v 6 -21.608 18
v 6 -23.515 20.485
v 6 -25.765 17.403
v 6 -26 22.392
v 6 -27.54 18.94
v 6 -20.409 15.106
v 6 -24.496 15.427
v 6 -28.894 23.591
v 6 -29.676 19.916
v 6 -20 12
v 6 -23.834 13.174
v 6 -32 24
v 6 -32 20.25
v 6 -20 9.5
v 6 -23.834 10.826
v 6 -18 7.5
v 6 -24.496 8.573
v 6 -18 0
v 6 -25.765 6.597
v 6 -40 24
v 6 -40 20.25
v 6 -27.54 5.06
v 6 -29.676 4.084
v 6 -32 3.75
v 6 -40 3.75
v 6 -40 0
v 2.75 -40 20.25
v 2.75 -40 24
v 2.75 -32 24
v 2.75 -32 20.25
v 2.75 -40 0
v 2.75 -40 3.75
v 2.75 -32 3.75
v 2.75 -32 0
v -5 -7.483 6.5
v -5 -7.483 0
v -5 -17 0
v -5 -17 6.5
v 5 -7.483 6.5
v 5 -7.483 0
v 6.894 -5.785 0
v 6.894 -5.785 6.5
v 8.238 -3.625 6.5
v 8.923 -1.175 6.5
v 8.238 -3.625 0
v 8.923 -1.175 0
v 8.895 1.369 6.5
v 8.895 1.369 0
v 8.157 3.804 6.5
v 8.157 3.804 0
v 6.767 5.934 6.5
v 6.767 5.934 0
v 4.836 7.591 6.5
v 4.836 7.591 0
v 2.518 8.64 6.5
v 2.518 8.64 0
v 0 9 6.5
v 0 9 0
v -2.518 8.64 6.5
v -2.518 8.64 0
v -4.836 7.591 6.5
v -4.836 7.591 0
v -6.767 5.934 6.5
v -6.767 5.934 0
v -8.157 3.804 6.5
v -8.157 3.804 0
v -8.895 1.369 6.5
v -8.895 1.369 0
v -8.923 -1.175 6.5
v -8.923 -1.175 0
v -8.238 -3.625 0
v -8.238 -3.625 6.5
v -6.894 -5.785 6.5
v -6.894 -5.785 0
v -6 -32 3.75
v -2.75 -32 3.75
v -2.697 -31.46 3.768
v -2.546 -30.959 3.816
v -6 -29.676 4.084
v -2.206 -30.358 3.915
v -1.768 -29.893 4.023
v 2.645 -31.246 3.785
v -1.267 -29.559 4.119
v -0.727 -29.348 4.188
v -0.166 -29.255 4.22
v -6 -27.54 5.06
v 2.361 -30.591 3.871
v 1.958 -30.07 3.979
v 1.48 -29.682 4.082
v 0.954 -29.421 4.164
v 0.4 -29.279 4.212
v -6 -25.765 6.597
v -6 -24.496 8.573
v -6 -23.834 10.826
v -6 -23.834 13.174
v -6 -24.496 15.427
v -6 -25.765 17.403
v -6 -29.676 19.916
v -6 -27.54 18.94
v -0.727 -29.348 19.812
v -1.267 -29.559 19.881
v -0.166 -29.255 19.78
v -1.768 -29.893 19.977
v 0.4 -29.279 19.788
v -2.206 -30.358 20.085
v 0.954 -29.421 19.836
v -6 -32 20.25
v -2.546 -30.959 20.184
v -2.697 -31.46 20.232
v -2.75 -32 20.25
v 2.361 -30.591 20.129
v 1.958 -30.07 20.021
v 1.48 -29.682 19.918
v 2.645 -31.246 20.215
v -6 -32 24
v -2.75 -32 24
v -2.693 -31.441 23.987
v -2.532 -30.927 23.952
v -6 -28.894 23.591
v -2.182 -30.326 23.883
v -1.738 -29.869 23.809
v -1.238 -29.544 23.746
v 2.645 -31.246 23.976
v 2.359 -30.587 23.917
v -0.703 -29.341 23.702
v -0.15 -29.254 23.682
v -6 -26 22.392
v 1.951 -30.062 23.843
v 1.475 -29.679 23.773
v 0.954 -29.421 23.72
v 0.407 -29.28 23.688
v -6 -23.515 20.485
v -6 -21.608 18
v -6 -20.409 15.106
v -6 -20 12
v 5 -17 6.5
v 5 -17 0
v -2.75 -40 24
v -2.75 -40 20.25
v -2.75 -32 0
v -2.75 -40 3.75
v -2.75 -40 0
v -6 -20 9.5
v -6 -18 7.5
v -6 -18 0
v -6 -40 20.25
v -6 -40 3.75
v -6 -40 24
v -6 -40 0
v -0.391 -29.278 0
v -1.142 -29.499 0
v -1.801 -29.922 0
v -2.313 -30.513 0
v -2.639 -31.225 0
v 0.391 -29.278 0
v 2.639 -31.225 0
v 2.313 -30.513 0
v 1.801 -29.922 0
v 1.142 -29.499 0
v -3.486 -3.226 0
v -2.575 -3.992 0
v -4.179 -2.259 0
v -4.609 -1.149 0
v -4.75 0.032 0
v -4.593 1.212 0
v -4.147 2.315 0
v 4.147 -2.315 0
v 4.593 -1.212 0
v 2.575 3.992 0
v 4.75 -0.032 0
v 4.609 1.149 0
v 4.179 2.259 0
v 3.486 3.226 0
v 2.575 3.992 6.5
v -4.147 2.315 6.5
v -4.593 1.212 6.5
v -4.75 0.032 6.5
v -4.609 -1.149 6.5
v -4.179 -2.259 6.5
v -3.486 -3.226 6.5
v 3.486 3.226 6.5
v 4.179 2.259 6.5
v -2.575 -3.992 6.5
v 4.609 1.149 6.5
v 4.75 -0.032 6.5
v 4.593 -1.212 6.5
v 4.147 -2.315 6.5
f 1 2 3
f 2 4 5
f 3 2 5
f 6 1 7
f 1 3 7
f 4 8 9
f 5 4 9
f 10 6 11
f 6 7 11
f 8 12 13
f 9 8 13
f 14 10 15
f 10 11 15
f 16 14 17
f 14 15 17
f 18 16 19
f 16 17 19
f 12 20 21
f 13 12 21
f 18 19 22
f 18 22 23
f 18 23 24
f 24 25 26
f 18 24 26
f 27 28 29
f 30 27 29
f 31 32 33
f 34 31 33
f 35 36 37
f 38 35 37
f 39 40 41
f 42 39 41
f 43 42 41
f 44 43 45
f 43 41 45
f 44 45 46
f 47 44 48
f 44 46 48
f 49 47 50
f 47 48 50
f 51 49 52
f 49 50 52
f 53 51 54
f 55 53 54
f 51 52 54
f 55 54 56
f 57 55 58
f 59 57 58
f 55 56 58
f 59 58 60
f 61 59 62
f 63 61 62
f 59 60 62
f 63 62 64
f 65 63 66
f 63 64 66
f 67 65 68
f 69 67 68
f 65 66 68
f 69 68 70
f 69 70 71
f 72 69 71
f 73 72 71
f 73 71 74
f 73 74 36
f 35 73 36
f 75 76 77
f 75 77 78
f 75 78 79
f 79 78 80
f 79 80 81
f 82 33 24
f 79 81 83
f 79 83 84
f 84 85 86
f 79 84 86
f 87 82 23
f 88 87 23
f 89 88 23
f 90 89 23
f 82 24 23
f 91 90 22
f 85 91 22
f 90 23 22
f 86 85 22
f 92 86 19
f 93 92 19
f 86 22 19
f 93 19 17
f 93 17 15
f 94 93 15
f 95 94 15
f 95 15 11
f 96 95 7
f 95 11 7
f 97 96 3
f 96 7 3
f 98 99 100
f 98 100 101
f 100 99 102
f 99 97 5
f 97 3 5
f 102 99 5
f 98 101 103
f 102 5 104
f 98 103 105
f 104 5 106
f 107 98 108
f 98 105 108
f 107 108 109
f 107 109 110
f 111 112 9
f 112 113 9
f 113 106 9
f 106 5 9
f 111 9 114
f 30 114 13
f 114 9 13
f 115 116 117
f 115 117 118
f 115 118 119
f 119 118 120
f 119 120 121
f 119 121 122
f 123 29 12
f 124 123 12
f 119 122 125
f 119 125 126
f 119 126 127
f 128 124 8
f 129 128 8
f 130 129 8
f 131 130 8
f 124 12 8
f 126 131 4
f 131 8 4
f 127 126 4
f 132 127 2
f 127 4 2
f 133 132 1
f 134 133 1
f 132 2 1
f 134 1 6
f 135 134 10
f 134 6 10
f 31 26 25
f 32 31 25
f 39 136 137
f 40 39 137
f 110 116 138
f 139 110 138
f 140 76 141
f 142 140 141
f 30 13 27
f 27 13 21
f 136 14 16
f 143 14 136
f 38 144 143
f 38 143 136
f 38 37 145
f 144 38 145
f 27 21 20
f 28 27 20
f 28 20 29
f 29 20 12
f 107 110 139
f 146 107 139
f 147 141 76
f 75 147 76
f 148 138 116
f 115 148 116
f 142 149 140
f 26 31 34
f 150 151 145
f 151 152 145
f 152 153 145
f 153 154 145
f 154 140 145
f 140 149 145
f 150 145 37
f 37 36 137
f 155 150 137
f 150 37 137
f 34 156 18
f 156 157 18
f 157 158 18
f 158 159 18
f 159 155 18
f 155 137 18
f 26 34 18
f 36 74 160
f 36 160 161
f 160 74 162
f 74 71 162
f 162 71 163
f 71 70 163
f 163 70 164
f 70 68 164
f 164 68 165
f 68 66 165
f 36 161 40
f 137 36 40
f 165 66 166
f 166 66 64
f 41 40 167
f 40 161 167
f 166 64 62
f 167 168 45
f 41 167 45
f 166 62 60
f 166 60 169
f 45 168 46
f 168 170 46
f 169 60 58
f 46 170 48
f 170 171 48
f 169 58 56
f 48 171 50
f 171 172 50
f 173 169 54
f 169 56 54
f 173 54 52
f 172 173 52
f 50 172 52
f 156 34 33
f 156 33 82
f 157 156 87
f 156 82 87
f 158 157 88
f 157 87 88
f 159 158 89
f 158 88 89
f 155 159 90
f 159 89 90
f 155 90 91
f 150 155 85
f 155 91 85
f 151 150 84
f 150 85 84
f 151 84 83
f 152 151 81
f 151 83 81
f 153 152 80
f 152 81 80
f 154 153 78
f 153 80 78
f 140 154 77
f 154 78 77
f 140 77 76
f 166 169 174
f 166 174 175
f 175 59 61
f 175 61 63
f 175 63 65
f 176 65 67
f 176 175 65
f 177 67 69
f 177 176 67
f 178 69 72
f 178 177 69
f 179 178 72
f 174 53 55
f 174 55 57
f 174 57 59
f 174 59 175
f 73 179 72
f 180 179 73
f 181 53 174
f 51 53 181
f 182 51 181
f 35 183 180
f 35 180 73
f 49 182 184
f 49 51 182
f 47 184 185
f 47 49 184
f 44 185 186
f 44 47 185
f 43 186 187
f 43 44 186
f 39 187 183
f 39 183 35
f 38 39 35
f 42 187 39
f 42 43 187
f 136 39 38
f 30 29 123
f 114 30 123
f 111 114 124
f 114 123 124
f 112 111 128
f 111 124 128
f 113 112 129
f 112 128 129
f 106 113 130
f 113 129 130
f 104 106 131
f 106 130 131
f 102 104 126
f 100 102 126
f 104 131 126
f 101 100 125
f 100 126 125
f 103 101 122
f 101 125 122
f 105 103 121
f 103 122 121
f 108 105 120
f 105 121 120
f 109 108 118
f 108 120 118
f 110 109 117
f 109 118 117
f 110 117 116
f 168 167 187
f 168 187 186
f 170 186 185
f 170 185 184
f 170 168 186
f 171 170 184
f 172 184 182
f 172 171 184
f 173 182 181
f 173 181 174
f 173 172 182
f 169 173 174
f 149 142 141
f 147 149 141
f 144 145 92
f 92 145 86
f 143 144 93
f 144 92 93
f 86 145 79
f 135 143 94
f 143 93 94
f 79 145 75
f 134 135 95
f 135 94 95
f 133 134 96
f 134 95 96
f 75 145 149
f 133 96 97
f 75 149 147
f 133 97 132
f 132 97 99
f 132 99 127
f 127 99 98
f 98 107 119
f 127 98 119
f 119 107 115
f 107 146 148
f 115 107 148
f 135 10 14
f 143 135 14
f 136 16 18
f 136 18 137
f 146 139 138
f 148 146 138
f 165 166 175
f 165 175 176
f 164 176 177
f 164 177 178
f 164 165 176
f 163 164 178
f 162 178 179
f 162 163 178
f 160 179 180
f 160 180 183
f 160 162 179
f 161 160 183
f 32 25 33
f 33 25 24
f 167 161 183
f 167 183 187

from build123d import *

# Parameters (mm, degrees)
BOSS_EXTRUDE1_DEPTH = 6.5
BOSS_EXTRUDE2_DEPTH = 6
CUT_EXTRUDE1_DEPTH  = 48.507894081
CHAMFER1_SIZE       = 3


with BuildPart() as part:
    # Sketch1 → Boss-Extrude1 (new body)
    with BuildSketch(Plane.XY):
        with BuildLine():
            Line((-5, -7.483314774), (-5, -22))
            Line((-5, -22), (5, -22))
            Line((5, -22), (5, -7.483314774))
            ThreePointArc((5, -7.483314774), (0, 9), (-5, -7.483314774))
        make_face()
        with BuildLine():
            Line((2.574956832, 3.99150314), (-4.147449153, 2.315419081))
            ThreePointArc((-4.147449153, 2.315419081), (-4.6089047, -1.149129004), (-2.574956832, -3.99150314))
            Line((-2.574956832, -3.99150314), (4.147449153, -2.315419081))
            ThreePointArc((4.147449153, -2.315419081), (4.6089047, 1.149129004), (2.574956832, 3.99150314))
        make_face(mode=Mode.SUBTRACT)
    extrude(amount=BOSS_EXTRUDE1_DEPTH)

    # Sketch2 → Boss-Extrude2 (add, symmetric)
    with BuildSketch(Plane(origin=(0, 0, 0), x_dir=(0, 0, -1), z_dir=(1, 0, 0))):
        with BuildLine():
            Line((-12, -20), (0, -20))
            Line((0, -20), (0, -40))
            Line((0, -40), (-3.75, -40))
            Line((-3.75, -40), (-3.75, -32))
            ThreePointArc((-3.75, -32), (-12, -23.75), (-20.25, -32))
            Line((-20.25, -32), (-20.25, -40))
            Line((-20.25, -40), (-24, -40))
            Line((-24, -40), (-24, -32))
            ThreePointArc((-24, -32), (-20.485281374, -23.514718626), (-12, -20))
        make_face()
    extrude(amount=BOSS_EXTRUDE2_DEPTH, both=True)

    # Sketch4 → Cut-Extrude1 (cut, through all)
    with BuildSketch(Plane.XY.offset(24)):
        with BuildLine():
            Line((-2.75, -32), (-2.75, -40))
            Line((-2.75, -40), (2.75, -40))
            Line((2.75, -40), (2.75, -32))
            ThreePointArc((2.75, -32), (0, -29.25), (-2.75, -32))
        make_face()
    extrude(amount=-CUT_EXTRUDE1_DEPTH, mode=Mode.SUBTRACT)

    # Chamfer1
    # the kernel refuses this chamfer: 3 mm, written as the material it adds along each edge
    with BuildSketch(Plane(origin=(-5, -20, 6.5), x_dir=(0.02749587661058619, 0.9996219169112968, 0), z_dir=(0, 0, -1))) as chamfer1_piece_1_section:
        Polygon((CHAMFER1_SIZE * 0.999621916911, -CHAMFER1_SIZE * 0.0274958766106), (-CHAMFER1_SIZE * 0.0274958766106, -CHAMFER1_SIZE * 0.999621916911), (0, 0), align=None)
    chamfer1_piece_1 = extrude(amount=6.5, mode=Mode.PRIVATE)
    chamfer1_piece_1 = split(chamfer1_piece_1, bisect_by=Plane(origin=(-6, -18.713879333, 3.25), z_dir=(1, 0, 0)), keep=Keep.TOP, mode=Mode.PRIVATE)
    add(chamfer1_piece_1)
    with BuildSketch(Plane(origin=(-5, -20, 6.5), x_dir=(0, -0.02749587661058678, 0.9996219169112968), z_dir=(1, 0, 0))) as chamfer1_piece_2:
        Polygon((CHAMFER1_SIZE * 0.999621916911, -CHAMFER1_SIZE * 0.0274958766106), (-CHAMFER1_SIZE * 0.0274958766106, -CHAMFER1_SIZE * 0.999621916911), (0, 0), align=None)
    extrude(amount=10)
    with BuildSketch(Plane(origin=(5, -20, 0), x_dir=(0.9996219169112968, -0.02749587661058678, 0), z_dir=(0, 0, 1))) as chamfer1_piece_3_section:
        Polygon((CHAMFER1_SIZE * 0.999621916911, CHAMFER1_SIZE * 0.0274958766106), (-CHAMFER1_SIZE * 0.0274958766106, CHAMFER1_SIZE * 0.999621916911), (0, 0), align=None)
    chamfer1_piece_3 = extrude(amount=6.5, mode=Mode.PRIVATE)
    chamfer1_piece_3 = split(chamfer1_piece_3, bisect_by=Plane(origin=(6, -18.713879333, 3.25), z_dir=(-1, 0, 0)), keep=Keep.TOP, mode=Mode.PRIVATE)
    add(chamfer1_piece_3)
    with BuildSketch(Plane(origin=(-5, -20, 14.215048964), x_dir=(0.02749587661058619, 0.9996219169112968, 0), z_dir=(0, 0, -1))) as chamfer1_piece_4a_section:
        Polygon((CHAMFER1_SIZE * 0.999621916911, -CHAMFER1_SIZE * 0.0274958766106), (-CHAMFER1_SIZE * 0.0274958766106, -CHAMFER1_SIZE * 0.999621916911), (0, 0), align=None)
    chamfer1_piece_4a = extrude(amount=14.215048964, mode=Mode.PRIVATE)
    chamfer1_piece_4a = split(chamfer1_piece_4a, bisect_by=Plane(origin=(-5.42545334, -18.713879333, 6.5), z_dir=(0, 0, 1)), keep=Keep.TOP, mode=Mode.PRIVATE)
    chamfer1_piece_4a = split(chamfer1_piece_4a, bisect_by=Plane(origin=(-6, -18.713879333, 10.357524482), z_dir=(1, 0, 0)), keep=Keep.TOP, mode=Mode.PRIVATE)
    with BuildSketch(Plane(origin=(-12.715048964, -20, 6.5), x_dir=(0, -0.02749587661058678, 0.9996219169112968), z_dir=(1, 0, 0))) as chamfer1_piece_4b_section:
        Polygon((CHAMFER1_SIZE * 0.999621916911, -CHAMFER1_SIZE * 0.0274958766106), (-CHAMFER1_SIZE * 0.0274958766106, -CHAMFER1_SIZE * 0.999621916911), (0, 0), align=None)
    chamfer1_piece_4b = extrude(amount=17.715048964, mode=Mode.PRIVATE)
    chamfer1_piece_4b = split(chamfer1_piece_4b, bisect_by=Plane(origin=(-5, -19.01061912, 7.48938088), z_dir=(-1, 0, 0)), keep=Keep.TOP, mode=Mode.PRIVATE)
    chamfer1_piece_4b = split(chamfer1_piece_4b, bisect_by=Plane(origin=(-6, -19.01061912, 7.48938088), z_dir=(1, 0, 0)), keep=Keep.TOP, mode=Mode.PRIVATE)
    chamfer1_piece_4 = chamfer1_piece_4a & chamfer1_piece_4b
    add(chamfer1_piece_4)
    with BuildSketch(Plane(origin=(5, -20, 0), x_dir=(0.9996219169112968, -0.02749587661058678, 0), z_dir=(0, 0, 1))) as chamfer1_piece_5a_section:
        Polygon((CHAMFER1_SIZE * 0.999621916911, CHAMFER1_SIZE * 0.0274958766106), (-CHAMFER1_SIZE * 0.0274958766106, CHAMFER1_SIZE * 0.999621916911), (0, 0), align=None)
    chamfer1_piece_5a = extrude(amount=14.215048964, mode=Mode.PRIVATE)
    chamfer1_piece_5a = split(chamfer1_piece_5a, bisect_by=Plane(origin=(6, -18.713879333, 10.357524482), z_dir=(-1, 0, 0)), keep=Keep.TOP, mode=Mode.PRIVATE)
    chamfer1_piece_5a = split(chamfer1_piece_5a, bisect_by=Plane(origin=(5.42545334, -18.713879333, 6.5), z_dir=(0, 0, 1)), keep=Keep.TOP, mode=Mode.PRIVATE)
    with BuildSketch(Plane(origin=(-5, -20, 6.5), x_dir=(0, -0.02749587661058678, 0.9996219169112968), z_dir=(1, 0, 0))) as chamfer1_piece_5b_section:
        Polygon((CHAMFER1_SIZE * 0.999621916911, -CHAMFER1_SIZE * 0.0274958766106), (-CHAMFER1_SIZE * 0.0274958766106, -CHAMFER1_SIZE * 0.999621916911), (0, 0), align=None)
    chamfer1_piece_5b = extrude(amount=17.715048964, mode=Mode.PRIVATE)
    chamfer1_piece_5b = split(chamfer1_piece_5b, bisect_by=Plane(origin=(6, -19.01061912, 7.48938088), z_dir=(-1, 0, 0)), keep=Keep.TOP, mode=Mode.PRIVATE)
    chamfer1_piece_5b = split(chamfer1_piece_5b, bisect_by=Plane(origin=(5, -19.01061912, 7.48938088), z_dir=(1, 0, 0)), keep=Keep.TOP, mode=Mode.PRIVATE)
    chamfer1_piece_5 = chamfer1_piece_5a & chamfer1_piece_5b
    add(chamfer1_piece_5)


solid = part.part
